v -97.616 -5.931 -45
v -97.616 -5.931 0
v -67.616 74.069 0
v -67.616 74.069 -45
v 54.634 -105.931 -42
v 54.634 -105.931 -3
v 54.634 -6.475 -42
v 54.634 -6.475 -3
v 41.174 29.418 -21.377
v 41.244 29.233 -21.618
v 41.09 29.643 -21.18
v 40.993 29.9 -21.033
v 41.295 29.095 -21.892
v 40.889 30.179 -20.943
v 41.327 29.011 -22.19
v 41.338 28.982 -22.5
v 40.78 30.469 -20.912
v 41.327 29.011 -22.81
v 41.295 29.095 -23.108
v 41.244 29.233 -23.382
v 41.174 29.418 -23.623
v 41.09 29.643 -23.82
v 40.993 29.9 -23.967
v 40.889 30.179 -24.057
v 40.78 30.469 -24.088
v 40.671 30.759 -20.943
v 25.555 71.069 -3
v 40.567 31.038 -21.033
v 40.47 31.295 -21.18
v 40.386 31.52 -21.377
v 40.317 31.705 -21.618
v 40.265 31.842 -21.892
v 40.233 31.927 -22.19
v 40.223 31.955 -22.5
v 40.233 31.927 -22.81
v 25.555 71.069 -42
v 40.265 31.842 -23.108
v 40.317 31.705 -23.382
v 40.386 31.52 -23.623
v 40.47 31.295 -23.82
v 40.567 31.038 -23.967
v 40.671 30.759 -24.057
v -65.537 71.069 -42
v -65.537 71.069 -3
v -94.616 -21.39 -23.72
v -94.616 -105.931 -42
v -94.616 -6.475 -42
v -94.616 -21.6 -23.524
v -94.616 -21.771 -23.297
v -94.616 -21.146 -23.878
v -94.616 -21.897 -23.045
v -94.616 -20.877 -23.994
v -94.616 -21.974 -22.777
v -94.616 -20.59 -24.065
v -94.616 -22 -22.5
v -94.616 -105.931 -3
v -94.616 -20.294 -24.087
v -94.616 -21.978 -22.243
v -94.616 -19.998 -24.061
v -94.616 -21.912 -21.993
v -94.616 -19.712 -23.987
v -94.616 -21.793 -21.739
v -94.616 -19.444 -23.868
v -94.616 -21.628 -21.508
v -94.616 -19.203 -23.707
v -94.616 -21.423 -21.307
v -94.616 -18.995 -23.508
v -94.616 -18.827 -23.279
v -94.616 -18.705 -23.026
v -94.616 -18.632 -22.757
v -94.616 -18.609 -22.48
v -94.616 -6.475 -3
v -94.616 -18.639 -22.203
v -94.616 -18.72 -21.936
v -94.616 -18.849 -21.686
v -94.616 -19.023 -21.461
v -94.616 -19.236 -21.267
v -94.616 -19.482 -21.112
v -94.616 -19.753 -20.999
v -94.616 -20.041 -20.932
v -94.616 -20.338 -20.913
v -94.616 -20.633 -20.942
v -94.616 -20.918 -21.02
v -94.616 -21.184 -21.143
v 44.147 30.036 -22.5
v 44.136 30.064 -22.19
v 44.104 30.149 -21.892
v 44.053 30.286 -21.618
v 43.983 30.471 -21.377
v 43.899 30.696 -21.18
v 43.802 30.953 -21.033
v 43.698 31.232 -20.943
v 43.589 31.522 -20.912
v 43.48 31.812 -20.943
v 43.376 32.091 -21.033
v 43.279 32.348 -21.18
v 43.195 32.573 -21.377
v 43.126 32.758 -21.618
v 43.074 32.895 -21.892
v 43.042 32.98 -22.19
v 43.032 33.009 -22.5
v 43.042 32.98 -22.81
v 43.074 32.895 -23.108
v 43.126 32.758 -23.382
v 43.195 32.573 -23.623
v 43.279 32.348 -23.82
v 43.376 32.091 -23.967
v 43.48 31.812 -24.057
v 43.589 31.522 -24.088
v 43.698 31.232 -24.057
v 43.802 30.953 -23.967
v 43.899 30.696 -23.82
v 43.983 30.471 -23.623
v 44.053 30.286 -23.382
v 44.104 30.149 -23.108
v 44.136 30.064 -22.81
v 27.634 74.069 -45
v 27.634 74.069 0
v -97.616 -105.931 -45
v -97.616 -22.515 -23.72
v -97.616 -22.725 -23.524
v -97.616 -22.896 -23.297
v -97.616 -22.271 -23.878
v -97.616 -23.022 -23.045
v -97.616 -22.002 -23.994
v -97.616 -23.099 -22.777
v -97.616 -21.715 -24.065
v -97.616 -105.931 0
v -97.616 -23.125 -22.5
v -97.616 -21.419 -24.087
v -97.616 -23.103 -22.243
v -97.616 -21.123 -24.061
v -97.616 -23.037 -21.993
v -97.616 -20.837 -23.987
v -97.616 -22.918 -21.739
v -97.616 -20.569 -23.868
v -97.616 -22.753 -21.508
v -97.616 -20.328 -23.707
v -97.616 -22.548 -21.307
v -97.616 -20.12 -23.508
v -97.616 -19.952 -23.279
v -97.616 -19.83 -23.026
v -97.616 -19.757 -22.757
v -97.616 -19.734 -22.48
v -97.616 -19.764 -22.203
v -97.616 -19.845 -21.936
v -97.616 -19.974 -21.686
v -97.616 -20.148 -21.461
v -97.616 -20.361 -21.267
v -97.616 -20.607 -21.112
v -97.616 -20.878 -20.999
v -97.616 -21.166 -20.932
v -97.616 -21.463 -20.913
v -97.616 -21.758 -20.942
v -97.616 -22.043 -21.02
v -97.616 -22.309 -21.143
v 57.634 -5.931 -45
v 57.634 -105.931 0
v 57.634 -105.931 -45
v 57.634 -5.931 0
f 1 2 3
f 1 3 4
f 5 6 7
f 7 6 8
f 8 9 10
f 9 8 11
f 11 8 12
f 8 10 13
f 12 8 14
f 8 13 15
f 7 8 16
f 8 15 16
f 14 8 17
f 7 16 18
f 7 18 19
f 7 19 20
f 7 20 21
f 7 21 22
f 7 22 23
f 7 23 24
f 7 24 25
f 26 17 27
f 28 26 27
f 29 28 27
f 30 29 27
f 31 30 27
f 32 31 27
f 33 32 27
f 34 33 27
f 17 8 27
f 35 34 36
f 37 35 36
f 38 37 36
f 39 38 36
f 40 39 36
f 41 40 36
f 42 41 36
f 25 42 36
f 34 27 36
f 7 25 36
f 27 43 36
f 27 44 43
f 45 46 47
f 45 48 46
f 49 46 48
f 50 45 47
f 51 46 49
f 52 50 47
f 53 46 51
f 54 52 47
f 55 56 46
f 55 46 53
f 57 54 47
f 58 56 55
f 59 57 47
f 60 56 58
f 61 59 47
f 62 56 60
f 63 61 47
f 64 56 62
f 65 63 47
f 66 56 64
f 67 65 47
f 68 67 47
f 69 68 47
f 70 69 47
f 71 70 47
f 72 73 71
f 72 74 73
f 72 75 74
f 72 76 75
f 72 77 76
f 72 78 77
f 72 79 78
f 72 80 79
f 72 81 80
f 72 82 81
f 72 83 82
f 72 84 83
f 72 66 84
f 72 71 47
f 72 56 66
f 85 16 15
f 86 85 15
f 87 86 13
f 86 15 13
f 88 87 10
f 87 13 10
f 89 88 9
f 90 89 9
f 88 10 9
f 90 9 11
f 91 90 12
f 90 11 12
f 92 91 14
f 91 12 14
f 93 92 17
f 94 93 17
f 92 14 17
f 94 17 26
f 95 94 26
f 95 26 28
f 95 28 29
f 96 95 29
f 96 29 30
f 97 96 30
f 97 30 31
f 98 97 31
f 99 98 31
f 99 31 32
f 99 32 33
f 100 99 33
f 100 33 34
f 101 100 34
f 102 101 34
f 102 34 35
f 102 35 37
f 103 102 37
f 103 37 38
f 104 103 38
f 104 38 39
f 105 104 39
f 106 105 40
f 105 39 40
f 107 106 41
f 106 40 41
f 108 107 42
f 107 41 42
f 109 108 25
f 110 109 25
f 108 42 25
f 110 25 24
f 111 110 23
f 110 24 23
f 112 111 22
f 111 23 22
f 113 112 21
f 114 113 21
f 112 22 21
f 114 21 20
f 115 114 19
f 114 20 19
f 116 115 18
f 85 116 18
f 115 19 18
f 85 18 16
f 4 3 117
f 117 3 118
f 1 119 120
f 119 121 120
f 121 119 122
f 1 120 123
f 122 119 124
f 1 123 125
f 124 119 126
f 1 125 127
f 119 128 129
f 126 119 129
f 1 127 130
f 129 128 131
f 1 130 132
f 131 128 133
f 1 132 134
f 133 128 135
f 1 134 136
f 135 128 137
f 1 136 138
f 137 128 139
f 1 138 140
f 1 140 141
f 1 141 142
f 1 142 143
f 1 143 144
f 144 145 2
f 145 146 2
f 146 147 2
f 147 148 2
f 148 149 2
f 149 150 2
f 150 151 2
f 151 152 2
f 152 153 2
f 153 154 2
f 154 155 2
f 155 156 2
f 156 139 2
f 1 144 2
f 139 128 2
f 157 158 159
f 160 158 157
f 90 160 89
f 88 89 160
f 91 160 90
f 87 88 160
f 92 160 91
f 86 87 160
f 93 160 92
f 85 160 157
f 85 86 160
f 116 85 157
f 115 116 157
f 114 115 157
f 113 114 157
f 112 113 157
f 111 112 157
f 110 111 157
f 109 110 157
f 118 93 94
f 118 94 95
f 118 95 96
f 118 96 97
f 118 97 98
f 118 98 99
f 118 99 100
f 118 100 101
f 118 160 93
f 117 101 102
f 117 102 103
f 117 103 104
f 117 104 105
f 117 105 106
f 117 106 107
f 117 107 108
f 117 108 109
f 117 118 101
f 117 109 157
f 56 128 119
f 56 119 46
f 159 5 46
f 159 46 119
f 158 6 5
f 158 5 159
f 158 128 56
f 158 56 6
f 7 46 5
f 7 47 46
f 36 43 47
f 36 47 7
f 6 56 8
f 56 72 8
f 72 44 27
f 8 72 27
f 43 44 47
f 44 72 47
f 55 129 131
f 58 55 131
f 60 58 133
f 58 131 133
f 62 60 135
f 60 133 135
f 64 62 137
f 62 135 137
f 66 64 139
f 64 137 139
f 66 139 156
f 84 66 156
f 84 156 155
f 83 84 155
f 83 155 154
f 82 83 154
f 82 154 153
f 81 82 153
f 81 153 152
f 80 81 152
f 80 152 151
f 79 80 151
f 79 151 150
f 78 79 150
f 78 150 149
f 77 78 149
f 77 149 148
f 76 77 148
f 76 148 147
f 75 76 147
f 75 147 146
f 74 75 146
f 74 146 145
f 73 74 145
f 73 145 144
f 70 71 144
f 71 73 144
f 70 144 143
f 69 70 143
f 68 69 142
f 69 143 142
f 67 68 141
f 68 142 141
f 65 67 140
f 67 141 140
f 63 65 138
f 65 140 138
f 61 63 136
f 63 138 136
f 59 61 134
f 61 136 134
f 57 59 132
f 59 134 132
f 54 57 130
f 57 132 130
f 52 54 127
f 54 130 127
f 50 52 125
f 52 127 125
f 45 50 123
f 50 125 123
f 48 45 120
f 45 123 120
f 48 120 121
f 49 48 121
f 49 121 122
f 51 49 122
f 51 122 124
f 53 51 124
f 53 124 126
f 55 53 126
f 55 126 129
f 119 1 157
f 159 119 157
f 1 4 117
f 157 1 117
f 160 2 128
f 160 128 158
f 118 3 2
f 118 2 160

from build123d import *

# Parameters (mm, degrees)
F0_W     = 155.25
F0_H     = 180
F1_DEPTH = 45
F2_SIZE2 = 80
F2_SIZE  = 30
F3_SIZE2 = 30
F3_SIZE  = 80
F4_T     = -3
F6_D     = 3.175


with BuildPart() as f1:
    # F0 (on Top) → F1 (new body)
    with BuildSketch(Plane.XY):
        with Locations((-19.9909230247, -15.9310551924)):
            Rectangle(F0_W, F0_H)
    extrude(amount=-F1_DEPTH)

    # F2
    f2_edges = [f1.edges().sort_by_distance(p)[0] for p in [
        (-97.615923, 74.068945, -22.5),
    ]]
    f2_side = f1.faces().sort_by_distance((-19.990923, 74.068945, -22.5))[0]
    chamfer(f2_edges, length=F2_SIZE, length2=F2_SIZE2, reference=f2_side)

    # F3
    f3_edges = [f1.edges().sort_by_distance(p)[0] for p in [
        (57.634077, 74.068945, -22.5),
    ]]
    f3_side = f1.faces().sort_by_distance((57.634077, -15.931055, -22.5))[0]
    chamfer(f3_edges, length=F3_SIZE, length2=F3_SIZE2, reference=f3_side)

    # F4
    f4_openings = [f1.faces().sort_by_distance(p)[0] for p in [
        (-19.990923, -105.931055, -22.5),
    ]]
    offset(amount=F4_T, openings=f4_openings)

    # F6 (through all)
    with Locations(Plane(origin=(48.5785698877, 18.2169637079, 0), x_dir=(-0.3511234416, 0.9363291776, 0), z_dir=(0.9363291776, 0.3511234416, 0))):
        with Locations((14.2099045093, -22.5)):
            Hole(F6_D / 2)


solid = f1.part
